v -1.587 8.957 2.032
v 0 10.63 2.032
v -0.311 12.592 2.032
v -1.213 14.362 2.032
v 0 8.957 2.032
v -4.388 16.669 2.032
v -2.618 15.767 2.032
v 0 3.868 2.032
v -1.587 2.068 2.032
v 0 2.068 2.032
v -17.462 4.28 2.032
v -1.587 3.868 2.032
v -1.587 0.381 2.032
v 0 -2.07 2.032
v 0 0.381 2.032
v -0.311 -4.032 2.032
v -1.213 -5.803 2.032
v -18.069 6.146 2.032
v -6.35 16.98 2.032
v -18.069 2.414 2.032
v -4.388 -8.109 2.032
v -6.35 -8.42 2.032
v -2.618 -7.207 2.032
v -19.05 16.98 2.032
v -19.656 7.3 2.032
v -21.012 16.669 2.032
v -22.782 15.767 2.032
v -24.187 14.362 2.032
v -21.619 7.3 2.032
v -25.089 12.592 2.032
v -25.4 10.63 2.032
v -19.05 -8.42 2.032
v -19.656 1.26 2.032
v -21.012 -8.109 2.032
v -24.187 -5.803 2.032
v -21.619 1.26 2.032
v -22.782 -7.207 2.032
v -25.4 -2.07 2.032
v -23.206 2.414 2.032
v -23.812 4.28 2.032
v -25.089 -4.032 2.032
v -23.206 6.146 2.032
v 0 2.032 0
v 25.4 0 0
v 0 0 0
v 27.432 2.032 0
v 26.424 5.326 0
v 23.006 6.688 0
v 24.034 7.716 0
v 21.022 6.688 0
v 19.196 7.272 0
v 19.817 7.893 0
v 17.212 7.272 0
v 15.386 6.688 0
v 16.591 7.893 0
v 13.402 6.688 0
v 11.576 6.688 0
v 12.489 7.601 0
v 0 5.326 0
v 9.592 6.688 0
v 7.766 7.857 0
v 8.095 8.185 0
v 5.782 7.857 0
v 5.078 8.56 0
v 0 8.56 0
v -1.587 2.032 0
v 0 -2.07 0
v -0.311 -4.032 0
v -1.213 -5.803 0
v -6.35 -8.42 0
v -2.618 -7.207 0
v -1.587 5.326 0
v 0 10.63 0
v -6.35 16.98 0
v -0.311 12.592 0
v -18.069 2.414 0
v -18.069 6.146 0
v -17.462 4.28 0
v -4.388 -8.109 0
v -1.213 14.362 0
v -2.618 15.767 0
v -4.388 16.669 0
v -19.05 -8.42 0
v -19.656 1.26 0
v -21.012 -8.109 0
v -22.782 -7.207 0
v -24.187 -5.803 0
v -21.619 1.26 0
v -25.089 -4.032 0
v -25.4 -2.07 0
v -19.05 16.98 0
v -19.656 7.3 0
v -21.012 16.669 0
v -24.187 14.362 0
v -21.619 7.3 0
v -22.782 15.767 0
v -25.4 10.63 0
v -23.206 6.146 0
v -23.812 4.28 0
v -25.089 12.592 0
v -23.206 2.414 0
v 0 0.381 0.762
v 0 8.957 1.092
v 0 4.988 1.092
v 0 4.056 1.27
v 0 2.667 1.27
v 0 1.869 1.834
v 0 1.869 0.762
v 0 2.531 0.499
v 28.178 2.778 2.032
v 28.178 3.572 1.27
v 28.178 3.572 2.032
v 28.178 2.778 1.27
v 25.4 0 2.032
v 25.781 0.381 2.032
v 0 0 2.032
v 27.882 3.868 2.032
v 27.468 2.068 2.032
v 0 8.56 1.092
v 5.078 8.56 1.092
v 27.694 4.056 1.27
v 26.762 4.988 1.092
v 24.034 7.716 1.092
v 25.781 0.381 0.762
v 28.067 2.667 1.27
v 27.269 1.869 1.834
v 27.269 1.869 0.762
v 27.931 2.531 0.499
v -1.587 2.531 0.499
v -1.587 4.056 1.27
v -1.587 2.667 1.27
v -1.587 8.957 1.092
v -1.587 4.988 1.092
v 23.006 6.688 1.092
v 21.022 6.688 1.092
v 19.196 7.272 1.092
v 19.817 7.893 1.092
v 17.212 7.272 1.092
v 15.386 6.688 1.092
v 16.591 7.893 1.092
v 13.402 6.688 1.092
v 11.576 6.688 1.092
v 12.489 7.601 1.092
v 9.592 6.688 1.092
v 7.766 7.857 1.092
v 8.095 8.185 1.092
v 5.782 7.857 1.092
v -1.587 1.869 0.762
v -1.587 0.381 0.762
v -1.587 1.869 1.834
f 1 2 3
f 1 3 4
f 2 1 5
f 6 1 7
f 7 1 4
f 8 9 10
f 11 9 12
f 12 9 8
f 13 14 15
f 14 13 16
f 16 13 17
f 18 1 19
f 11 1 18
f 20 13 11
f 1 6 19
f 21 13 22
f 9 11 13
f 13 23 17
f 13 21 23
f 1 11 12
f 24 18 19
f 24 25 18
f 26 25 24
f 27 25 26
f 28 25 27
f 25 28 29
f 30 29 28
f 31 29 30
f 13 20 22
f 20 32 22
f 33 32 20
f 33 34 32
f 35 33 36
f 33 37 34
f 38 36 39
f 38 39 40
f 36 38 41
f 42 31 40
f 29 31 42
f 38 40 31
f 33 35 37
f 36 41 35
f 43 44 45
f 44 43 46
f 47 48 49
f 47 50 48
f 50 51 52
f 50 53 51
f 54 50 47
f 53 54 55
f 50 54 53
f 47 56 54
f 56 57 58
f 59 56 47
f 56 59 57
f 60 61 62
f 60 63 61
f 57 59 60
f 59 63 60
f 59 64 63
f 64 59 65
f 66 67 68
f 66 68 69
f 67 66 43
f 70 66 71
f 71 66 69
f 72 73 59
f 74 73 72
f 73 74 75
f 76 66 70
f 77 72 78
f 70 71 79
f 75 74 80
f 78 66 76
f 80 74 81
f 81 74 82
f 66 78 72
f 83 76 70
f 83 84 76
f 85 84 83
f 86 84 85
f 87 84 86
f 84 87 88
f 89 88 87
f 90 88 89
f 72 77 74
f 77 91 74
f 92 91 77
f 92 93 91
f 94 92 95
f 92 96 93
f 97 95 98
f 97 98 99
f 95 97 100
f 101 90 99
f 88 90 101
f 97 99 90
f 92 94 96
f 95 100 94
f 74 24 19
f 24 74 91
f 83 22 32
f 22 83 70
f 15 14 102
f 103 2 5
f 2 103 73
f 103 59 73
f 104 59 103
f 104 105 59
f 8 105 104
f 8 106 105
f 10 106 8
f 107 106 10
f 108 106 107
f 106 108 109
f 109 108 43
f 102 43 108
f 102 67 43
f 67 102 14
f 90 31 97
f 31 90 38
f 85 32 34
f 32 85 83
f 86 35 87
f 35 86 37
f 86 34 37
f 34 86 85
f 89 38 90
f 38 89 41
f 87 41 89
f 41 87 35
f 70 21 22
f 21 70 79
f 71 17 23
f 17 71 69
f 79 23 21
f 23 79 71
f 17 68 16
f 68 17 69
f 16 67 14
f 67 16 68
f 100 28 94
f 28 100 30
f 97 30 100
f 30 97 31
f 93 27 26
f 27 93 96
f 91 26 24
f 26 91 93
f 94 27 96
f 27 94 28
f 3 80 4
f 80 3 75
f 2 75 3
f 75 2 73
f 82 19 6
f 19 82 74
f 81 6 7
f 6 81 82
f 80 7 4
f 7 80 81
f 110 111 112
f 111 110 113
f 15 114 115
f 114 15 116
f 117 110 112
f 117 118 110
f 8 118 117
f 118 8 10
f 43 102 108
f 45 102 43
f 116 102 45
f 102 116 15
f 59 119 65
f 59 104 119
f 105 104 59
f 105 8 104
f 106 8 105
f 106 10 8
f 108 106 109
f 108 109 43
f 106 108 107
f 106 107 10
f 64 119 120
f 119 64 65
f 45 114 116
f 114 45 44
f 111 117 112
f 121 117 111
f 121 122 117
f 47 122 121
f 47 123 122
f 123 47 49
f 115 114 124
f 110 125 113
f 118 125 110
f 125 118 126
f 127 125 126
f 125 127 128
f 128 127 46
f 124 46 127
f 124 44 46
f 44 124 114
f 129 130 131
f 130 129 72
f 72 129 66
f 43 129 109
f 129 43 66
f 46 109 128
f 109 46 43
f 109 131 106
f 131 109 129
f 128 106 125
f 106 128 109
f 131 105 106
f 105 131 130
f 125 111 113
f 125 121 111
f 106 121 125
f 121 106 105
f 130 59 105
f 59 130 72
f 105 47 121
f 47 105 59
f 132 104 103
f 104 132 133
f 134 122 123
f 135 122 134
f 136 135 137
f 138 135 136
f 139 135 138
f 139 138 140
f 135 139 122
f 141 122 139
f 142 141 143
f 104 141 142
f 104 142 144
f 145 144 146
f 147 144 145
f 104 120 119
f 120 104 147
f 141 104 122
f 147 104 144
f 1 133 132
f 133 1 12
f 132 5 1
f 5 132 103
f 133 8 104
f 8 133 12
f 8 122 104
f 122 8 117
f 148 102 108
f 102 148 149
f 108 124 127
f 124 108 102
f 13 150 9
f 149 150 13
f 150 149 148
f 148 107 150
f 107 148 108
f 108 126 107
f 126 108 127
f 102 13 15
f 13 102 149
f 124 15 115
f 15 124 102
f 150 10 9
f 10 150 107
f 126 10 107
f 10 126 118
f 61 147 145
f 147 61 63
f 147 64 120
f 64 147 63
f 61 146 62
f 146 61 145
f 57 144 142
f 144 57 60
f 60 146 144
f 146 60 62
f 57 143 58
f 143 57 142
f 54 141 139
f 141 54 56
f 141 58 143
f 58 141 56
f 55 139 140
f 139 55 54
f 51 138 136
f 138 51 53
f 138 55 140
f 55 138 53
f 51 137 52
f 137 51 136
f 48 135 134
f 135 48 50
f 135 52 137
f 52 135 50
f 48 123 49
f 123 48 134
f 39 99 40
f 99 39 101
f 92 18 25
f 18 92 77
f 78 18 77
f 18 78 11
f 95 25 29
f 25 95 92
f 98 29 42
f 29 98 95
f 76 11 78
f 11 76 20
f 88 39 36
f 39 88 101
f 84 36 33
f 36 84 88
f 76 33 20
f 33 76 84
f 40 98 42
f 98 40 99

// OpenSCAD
// Physical Keygen - by Nirav Patel <http://eclecti.cc>
//
// Generate a duplicate of a Kwikset KW1 key by editing the last line of the file
// and entering in the key code of the lock.  If you don't know the key code,
// you can measure the key and compare the numbers at:
// http://web.archive.org/web/20050217020917fw_/http://dlaco.com/spacing/tips.htm
//
// This work is licensed under a Creative Commons Attribution 3.0 Unported License.

// Since the keys and locks I have were all designed in imperial units, the
// constants in this file will be defined in inches.  The mm function
// allows us to retain the proper size for exporting a metric STL.
function mm(i) = i*25.4;

module rounded(size, r) {
    union() {
        translate([r, 0, 0]) cube([size[0]-2*r, size[1], size[2]]);
        translate([0, r, 0]) cube([size[0], size[1]-2*r, size[2]]);
        translate([r, r, 0]) cylinder(h=size[2], r=r);
        translate([size[0]-r, r, 0]) cylinder(h=size[2], r=r);
        translate([r, size[1]-r, 0]) cylinder(h=size[2], r=r);
        translate([size[0]-r, size[1]-r, 0]) cylinder(h=size[2], r=r);
    }
}

module bit() {
    w = mm(1/4);
    difference() {
        translate([-w/2, 0, 0]) cube([w, mm(1), w]);
        translate([-mm(5/128), 0, 0]) rotate([0, 0, 135]) cube([w, w, w]);
        translate([mm(5/128), 0, 0]) rotate([0, 0, -45]) cube([w, w, w]);
    }
}

// Kwikset KW1 5 pin key.  The measurements are mostly guesses based on reverse
// engineering some keys I have and some publicly available information.
module kw1(bits) {
    // You may need to adjust these to fit your specific printer settings
    thickness = mm(0.080);
    length = mm(9/8);
    width = mm(.337);
    
    shoulder = mm(.247);
    pin_spacing = mm(.15);
    depth_inc = mm(.023);
    
    // A fudge factor.  Printing with your average RepRap, the bottom layer is
    // going to be squeezed larger than you want. You can make the pins
    // go slighly deeper by a fudge amount to make up for it if you aren't
    // adjusting for it elsewhere like Skeinforge or in your firmware.
    fudge = 0.5;
    
    // Handle size
    h_l = mm(1);
    h_w = mm(1);
    h_d = mm(1/16);
    difference() {
        // blade and key handle
        union() {
            translate([-h_l, -h_w/2 + width/2, 0]) rounded([h_l, h_w, thickness], mm(1/4));
            // cut a little off the tip to avoid going too long
            cube([length - mm(1/64), width, thickness]);
        }
        
        // chamfer the tip
        translate([length, mm(1/8), 0]) {
            rotate([0, 0, 45]) cube([10, 10, thickness]);
            rotate([0, 0, 225]) cube([10, 10, thickness]);
        }
        
        // put in a hole for keychain use
        translate([-h_l + mm(3/16), width/2, 0]) cylinder(h=thickness, r=mm(1/8));
        
        // cut the channels in the key.  designed more for printability than accuracy
        union() {
            translate([-h_d, mm(.105), mm(.025)]) rotate([225, 0, 0]) cube([length + h_d, width, width]);
            translate([-h_d, mm(.105), mm(.05)]) rotate([260, 0, 0]) cube([length + h_d, thickness/2, mm(1/32)]);
            translate([-h_d, mm(.105), 0]) cube([length + h_d, mm(7/128), mm(.05)]);
            translate([-h_d, mm(.105) + mm(7/128), mm(.05)]) rotate([225, 0, 0]) cube([length + h_d, mm(3/64), thickness]);
        }
        
        translate([-h_d, width - mm(9/64), mm(.043)]) {
            cube([length + h_d, width - (width - mm(10/64)), thickness]);
            rotate([50, 0, 0]) cube([length + h_d, width, thickness]);
        }
        
        union() {
            translate([-h_d, mm(0.015), mm(.03)]) cube([length + h_d, mm(15/256), thickness]);
            translate([-h_d, mm(0.015) + mm(13/256), thickness - mm(1/64)]) rotate([45, 0, 0]) cube([length + h_d, mm(1/16), mm(1/16)]);
        }
        
        // Do the actual bitting
        for (b = [0:4]) {
            // KW1 doesn't have a 0 value and instead has 1 start around .008" deep
            translate([shoulder + fudge + b*pin_spacing, width - mm(.008) - (bits[b] - 1)*depth_inc - fudge, 0]) bit();
        }
    }
}

// This sample key goes to a lock that is sitting disassembled on my desk
// Flip the key over for easy printing
kw1([1,3,3,2,3]);
